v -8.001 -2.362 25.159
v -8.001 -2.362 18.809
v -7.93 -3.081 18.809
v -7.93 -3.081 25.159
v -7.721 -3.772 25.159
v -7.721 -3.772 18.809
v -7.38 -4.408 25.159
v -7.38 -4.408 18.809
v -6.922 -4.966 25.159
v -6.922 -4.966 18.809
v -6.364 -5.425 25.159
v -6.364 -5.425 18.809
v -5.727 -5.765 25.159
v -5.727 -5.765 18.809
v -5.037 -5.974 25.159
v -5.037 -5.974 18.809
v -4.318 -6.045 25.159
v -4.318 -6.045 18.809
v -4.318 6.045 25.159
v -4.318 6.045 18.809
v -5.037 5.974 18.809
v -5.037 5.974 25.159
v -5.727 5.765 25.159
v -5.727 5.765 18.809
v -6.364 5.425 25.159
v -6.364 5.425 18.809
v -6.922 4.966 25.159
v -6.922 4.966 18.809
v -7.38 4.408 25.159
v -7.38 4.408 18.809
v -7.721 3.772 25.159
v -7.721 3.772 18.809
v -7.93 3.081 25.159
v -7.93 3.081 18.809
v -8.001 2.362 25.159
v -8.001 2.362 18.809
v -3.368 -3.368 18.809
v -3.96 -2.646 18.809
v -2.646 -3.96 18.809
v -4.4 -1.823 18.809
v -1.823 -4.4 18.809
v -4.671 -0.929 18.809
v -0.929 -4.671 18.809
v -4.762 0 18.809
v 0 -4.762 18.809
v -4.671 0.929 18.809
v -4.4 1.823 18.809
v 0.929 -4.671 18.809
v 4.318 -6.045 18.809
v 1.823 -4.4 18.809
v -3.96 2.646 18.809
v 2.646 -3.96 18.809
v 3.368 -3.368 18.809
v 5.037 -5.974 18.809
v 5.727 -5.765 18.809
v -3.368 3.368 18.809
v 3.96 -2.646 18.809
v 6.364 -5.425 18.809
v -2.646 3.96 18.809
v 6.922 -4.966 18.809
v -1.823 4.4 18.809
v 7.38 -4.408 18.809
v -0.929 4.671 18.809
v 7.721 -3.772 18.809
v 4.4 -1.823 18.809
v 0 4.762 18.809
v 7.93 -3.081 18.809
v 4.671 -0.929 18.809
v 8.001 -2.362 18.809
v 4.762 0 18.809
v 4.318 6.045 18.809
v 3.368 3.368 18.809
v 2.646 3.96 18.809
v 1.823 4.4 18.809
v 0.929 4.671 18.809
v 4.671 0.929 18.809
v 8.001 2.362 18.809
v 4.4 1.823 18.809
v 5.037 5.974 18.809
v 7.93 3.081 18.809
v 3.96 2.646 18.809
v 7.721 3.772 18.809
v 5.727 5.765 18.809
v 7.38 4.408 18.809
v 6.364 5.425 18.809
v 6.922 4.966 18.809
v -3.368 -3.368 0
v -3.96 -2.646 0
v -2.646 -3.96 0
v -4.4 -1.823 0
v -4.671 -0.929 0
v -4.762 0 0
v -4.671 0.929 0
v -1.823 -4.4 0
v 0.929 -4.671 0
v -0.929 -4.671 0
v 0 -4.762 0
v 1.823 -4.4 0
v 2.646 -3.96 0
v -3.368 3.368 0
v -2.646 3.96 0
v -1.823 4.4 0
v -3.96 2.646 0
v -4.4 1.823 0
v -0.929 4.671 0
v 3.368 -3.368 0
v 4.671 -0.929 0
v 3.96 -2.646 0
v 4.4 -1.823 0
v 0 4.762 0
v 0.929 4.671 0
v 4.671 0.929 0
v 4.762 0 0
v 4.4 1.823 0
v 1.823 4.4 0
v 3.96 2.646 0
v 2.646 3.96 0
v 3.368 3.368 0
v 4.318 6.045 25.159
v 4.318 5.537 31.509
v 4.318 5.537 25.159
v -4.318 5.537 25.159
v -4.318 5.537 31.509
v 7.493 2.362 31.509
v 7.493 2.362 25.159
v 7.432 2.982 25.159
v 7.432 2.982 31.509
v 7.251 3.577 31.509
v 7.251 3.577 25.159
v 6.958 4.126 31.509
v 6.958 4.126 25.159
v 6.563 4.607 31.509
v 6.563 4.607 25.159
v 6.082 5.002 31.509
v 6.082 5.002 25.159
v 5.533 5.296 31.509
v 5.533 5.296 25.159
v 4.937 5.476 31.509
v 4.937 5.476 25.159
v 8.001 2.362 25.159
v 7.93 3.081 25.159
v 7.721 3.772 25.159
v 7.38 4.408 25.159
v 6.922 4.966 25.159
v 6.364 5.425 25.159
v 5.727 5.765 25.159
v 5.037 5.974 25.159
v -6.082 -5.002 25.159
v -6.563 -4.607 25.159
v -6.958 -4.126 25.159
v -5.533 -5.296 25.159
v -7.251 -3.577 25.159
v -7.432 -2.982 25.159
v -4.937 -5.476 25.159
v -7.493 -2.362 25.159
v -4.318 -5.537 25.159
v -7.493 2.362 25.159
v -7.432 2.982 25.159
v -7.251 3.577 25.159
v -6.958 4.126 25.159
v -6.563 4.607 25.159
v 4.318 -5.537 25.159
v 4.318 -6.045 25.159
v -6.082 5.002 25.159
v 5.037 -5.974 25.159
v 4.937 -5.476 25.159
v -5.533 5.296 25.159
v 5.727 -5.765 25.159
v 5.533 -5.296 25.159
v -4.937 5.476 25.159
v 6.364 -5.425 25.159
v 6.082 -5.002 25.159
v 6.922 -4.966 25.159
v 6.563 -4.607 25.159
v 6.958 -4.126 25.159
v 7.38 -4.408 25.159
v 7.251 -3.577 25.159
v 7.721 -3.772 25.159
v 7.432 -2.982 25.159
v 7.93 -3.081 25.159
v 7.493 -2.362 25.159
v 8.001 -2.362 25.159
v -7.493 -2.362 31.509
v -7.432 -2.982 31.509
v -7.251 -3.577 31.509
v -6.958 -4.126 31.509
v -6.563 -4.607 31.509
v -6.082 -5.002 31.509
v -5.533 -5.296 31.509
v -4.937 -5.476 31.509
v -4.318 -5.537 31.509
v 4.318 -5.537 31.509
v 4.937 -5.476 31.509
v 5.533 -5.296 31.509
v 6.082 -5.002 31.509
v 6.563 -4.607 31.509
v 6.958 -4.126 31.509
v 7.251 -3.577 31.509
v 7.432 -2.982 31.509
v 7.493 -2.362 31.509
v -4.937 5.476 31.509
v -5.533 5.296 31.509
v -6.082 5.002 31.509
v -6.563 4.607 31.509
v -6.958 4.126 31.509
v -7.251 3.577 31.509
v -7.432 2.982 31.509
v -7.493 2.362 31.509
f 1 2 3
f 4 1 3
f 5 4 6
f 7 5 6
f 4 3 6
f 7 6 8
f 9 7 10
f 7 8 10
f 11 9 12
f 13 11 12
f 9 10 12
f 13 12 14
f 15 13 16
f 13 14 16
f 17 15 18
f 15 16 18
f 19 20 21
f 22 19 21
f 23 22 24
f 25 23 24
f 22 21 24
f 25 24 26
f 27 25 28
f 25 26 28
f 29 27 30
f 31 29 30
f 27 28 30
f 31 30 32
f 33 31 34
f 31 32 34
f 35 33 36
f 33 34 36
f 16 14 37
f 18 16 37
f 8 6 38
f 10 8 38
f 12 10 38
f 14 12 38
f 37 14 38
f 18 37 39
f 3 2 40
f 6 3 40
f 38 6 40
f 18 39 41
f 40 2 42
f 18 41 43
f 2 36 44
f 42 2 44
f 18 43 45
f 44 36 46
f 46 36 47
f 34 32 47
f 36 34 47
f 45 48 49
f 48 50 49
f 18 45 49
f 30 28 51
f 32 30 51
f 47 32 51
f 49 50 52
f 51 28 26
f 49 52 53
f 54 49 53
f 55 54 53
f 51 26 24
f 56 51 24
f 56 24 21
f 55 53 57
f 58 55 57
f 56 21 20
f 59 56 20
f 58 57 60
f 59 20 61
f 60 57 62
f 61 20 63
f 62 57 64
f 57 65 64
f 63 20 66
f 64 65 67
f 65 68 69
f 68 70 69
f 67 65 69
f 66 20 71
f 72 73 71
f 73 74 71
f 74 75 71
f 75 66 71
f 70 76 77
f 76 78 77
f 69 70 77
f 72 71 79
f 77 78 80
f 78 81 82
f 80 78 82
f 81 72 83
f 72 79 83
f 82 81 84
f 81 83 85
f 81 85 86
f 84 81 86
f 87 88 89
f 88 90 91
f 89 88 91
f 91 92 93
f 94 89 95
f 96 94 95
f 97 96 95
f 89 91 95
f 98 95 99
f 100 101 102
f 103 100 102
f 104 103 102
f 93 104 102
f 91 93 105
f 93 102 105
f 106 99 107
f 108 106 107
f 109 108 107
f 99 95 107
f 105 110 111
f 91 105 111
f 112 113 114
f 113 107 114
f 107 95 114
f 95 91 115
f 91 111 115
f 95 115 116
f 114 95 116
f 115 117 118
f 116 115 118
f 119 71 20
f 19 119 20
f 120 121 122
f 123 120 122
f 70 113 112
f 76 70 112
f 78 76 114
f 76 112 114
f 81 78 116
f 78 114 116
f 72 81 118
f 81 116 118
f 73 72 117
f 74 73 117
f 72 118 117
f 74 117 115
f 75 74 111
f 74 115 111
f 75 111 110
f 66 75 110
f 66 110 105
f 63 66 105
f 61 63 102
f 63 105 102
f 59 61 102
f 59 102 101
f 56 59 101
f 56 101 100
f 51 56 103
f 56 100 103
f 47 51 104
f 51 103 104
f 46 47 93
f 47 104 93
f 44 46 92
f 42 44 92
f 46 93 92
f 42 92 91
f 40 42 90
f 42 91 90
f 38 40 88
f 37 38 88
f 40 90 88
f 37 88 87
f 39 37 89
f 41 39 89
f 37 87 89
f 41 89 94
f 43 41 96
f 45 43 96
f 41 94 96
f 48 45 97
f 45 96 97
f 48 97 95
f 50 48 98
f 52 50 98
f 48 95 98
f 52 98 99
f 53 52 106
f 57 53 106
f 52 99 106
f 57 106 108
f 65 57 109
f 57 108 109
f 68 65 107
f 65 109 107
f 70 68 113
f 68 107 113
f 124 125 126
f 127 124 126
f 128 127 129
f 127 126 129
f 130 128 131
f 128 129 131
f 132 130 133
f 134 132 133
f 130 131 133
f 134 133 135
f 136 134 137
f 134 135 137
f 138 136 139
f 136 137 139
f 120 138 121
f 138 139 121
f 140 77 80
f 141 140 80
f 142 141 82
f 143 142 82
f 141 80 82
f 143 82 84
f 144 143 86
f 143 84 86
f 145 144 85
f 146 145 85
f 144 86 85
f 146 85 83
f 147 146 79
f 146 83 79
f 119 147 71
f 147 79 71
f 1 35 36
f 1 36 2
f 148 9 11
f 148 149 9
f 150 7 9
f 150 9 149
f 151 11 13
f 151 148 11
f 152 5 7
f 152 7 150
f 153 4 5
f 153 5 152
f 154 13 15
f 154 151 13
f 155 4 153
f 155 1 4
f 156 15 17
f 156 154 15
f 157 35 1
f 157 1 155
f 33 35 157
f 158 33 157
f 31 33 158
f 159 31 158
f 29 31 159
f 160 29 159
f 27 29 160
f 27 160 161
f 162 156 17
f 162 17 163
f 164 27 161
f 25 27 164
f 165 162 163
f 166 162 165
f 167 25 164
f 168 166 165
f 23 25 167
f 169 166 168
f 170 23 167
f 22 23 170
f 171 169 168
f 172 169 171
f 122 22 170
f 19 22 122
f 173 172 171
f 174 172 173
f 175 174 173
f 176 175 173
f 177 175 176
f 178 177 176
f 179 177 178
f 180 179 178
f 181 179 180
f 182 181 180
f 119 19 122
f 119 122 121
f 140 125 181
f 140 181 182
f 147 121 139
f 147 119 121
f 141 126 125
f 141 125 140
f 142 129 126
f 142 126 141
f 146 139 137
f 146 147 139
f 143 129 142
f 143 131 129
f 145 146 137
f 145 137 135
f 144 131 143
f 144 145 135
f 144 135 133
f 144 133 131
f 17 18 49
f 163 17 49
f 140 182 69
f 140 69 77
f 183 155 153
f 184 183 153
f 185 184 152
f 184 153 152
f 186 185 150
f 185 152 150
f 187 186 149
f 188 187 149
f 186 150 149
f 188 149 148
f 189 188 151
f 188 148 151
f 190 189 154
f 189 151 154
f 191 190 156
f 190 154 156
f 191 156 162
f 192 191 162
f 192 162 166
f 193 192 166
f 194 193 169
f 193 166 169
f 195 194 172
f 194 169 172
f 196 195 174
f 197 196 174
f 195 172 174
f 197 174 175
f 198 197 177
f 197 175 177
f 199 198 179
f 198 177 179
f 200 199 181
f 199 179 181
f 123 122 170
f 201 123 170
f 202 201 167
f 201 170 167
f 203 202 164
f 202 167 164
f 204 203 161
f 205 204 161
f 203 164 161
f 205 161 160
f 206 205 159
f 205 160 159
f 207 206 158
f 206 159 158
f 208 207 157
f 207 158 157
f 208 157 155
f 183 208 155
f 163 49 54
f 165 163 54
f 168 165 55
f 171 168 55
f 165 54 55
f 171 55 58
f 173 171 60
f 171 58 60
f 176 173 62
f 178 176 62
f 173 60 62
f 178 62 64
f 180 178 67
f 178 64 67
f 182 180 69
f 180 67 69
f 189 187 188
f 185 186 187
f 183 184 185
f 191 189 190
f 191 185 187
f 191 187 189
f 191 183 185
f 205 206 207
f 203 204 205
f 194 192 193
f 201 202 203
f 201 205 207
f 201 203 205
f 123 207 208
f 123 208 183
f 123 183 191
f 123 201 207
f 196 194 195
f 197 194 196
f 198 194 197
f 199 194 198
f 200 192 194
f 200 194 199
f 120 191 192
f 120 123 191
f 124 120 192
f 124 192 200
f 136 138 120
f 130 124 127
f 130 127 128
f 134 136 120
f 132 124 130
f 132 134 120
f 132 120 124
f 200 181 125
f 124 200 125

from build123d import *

# Parameters (mm, degrees)
F0_R     = 4.7625
F1_DEPTH = 18.8087
F2_R     = 4.7625
F3_DEPTH = 12.7
F4_DEPTH = 6.35


with BuildPart() as f1:
    # F0 (on Top) → F1 (new body)
    with BuildSketch(Plane.XY):
        Circle(F0_R)
    extrude(amount=F1_DEPTH)

    # F2 (on face) → F3 (join)
    with BuildSketch(Plane.XY.offset(18.8087)):
        with BuildLine():
            ThreePointArc((7.493, 2.3622), (6.563064, 4.607264), (4.318, 5.5372))
            Line((4.318, 5.5372), (-4.318, 5.5372))
            ThreePointArc((-4.318, 5.5372), (-6.563064, 4.607264), (-7.493, 2.3622))
            Line((-7.493, 2.3622), (-7.493, -2.3622))
            ThreePointArc((-7.493, -2.3622), (-6.563064, -4.607264), (-4.318, -5.5372))
            Line((-4.318, -5.5372), (4.318, -5.5372))
            ThreePointArc((4.318, -5.5372), (6.563064, -4.607264), (7.493, -2.3622))
            Line((7.493, -2.3622), (7.493, 2.3622))
        make_face()
        Circle(F2_R, mode=Mode.SUBTRACT)
        Circle(F2_R)
    extrude(amount=F3_DEPTH)

    # F2 (on face) → F4 (join)
    with BuildSketch(Plane.XY.offset(18.8087)):
        with BuildLine():
            Line((8.001, -2.3622), (8.001, 2.3622))
            ThreePointArc((8.001, 2.3622), (6.922274, 4.966474), (4.318, 6.0452))
            Line((4.318, 6.0452), (-4.318, 6.0452))
            ThreePointArc((-4.318, 6.0452), (-6.922274, 4.966474), (-8.001, 2.3622))
            Line((-8.001, 2.3622), (-8.001, -2.3622))
            ThreePointArc((-8.001, -2.3622), (-6.922274, -4.966474), (-4.318, -6.0452))
            Line((-4.318, -6.0452), (4.318, -6.0452))
            ThreePointArc((4.318, -6.0452), (6.922274, -4.966474), (8.001, -2.3622))
        make_face()
        with BuildLine():
            Line((-4.318, 5.5372), (4.318, 5.5372))
            ThreePointArc((4.318, 5.5372), (6.563064, 4.607264), (7.493, 2.3622))
            Line((7.493, 2.3622), (7.493, -2.3622))
            ThreePointArc((7.493, -2.3622), (6.563064, -4.607264), (4.318, -5.5372))
            Line((4.318, -5.5372), (-4.318, -5.5372))
            ThreePointArc((-4.318, -5.5372), (-6.563064, -4.607264), (-7.493, -2.3622))
            Line((-7.493, -2.3622), (-7.493, 2.3622))
            ThreePointArc((-7.493, 2.3622), (-6.563064, 4.607264), (-4.318, 5.5372))
        make_face(mode=Mode.SUBTRACT)
    extrude(amount=F4_DEPTH)


solid = f1.part
